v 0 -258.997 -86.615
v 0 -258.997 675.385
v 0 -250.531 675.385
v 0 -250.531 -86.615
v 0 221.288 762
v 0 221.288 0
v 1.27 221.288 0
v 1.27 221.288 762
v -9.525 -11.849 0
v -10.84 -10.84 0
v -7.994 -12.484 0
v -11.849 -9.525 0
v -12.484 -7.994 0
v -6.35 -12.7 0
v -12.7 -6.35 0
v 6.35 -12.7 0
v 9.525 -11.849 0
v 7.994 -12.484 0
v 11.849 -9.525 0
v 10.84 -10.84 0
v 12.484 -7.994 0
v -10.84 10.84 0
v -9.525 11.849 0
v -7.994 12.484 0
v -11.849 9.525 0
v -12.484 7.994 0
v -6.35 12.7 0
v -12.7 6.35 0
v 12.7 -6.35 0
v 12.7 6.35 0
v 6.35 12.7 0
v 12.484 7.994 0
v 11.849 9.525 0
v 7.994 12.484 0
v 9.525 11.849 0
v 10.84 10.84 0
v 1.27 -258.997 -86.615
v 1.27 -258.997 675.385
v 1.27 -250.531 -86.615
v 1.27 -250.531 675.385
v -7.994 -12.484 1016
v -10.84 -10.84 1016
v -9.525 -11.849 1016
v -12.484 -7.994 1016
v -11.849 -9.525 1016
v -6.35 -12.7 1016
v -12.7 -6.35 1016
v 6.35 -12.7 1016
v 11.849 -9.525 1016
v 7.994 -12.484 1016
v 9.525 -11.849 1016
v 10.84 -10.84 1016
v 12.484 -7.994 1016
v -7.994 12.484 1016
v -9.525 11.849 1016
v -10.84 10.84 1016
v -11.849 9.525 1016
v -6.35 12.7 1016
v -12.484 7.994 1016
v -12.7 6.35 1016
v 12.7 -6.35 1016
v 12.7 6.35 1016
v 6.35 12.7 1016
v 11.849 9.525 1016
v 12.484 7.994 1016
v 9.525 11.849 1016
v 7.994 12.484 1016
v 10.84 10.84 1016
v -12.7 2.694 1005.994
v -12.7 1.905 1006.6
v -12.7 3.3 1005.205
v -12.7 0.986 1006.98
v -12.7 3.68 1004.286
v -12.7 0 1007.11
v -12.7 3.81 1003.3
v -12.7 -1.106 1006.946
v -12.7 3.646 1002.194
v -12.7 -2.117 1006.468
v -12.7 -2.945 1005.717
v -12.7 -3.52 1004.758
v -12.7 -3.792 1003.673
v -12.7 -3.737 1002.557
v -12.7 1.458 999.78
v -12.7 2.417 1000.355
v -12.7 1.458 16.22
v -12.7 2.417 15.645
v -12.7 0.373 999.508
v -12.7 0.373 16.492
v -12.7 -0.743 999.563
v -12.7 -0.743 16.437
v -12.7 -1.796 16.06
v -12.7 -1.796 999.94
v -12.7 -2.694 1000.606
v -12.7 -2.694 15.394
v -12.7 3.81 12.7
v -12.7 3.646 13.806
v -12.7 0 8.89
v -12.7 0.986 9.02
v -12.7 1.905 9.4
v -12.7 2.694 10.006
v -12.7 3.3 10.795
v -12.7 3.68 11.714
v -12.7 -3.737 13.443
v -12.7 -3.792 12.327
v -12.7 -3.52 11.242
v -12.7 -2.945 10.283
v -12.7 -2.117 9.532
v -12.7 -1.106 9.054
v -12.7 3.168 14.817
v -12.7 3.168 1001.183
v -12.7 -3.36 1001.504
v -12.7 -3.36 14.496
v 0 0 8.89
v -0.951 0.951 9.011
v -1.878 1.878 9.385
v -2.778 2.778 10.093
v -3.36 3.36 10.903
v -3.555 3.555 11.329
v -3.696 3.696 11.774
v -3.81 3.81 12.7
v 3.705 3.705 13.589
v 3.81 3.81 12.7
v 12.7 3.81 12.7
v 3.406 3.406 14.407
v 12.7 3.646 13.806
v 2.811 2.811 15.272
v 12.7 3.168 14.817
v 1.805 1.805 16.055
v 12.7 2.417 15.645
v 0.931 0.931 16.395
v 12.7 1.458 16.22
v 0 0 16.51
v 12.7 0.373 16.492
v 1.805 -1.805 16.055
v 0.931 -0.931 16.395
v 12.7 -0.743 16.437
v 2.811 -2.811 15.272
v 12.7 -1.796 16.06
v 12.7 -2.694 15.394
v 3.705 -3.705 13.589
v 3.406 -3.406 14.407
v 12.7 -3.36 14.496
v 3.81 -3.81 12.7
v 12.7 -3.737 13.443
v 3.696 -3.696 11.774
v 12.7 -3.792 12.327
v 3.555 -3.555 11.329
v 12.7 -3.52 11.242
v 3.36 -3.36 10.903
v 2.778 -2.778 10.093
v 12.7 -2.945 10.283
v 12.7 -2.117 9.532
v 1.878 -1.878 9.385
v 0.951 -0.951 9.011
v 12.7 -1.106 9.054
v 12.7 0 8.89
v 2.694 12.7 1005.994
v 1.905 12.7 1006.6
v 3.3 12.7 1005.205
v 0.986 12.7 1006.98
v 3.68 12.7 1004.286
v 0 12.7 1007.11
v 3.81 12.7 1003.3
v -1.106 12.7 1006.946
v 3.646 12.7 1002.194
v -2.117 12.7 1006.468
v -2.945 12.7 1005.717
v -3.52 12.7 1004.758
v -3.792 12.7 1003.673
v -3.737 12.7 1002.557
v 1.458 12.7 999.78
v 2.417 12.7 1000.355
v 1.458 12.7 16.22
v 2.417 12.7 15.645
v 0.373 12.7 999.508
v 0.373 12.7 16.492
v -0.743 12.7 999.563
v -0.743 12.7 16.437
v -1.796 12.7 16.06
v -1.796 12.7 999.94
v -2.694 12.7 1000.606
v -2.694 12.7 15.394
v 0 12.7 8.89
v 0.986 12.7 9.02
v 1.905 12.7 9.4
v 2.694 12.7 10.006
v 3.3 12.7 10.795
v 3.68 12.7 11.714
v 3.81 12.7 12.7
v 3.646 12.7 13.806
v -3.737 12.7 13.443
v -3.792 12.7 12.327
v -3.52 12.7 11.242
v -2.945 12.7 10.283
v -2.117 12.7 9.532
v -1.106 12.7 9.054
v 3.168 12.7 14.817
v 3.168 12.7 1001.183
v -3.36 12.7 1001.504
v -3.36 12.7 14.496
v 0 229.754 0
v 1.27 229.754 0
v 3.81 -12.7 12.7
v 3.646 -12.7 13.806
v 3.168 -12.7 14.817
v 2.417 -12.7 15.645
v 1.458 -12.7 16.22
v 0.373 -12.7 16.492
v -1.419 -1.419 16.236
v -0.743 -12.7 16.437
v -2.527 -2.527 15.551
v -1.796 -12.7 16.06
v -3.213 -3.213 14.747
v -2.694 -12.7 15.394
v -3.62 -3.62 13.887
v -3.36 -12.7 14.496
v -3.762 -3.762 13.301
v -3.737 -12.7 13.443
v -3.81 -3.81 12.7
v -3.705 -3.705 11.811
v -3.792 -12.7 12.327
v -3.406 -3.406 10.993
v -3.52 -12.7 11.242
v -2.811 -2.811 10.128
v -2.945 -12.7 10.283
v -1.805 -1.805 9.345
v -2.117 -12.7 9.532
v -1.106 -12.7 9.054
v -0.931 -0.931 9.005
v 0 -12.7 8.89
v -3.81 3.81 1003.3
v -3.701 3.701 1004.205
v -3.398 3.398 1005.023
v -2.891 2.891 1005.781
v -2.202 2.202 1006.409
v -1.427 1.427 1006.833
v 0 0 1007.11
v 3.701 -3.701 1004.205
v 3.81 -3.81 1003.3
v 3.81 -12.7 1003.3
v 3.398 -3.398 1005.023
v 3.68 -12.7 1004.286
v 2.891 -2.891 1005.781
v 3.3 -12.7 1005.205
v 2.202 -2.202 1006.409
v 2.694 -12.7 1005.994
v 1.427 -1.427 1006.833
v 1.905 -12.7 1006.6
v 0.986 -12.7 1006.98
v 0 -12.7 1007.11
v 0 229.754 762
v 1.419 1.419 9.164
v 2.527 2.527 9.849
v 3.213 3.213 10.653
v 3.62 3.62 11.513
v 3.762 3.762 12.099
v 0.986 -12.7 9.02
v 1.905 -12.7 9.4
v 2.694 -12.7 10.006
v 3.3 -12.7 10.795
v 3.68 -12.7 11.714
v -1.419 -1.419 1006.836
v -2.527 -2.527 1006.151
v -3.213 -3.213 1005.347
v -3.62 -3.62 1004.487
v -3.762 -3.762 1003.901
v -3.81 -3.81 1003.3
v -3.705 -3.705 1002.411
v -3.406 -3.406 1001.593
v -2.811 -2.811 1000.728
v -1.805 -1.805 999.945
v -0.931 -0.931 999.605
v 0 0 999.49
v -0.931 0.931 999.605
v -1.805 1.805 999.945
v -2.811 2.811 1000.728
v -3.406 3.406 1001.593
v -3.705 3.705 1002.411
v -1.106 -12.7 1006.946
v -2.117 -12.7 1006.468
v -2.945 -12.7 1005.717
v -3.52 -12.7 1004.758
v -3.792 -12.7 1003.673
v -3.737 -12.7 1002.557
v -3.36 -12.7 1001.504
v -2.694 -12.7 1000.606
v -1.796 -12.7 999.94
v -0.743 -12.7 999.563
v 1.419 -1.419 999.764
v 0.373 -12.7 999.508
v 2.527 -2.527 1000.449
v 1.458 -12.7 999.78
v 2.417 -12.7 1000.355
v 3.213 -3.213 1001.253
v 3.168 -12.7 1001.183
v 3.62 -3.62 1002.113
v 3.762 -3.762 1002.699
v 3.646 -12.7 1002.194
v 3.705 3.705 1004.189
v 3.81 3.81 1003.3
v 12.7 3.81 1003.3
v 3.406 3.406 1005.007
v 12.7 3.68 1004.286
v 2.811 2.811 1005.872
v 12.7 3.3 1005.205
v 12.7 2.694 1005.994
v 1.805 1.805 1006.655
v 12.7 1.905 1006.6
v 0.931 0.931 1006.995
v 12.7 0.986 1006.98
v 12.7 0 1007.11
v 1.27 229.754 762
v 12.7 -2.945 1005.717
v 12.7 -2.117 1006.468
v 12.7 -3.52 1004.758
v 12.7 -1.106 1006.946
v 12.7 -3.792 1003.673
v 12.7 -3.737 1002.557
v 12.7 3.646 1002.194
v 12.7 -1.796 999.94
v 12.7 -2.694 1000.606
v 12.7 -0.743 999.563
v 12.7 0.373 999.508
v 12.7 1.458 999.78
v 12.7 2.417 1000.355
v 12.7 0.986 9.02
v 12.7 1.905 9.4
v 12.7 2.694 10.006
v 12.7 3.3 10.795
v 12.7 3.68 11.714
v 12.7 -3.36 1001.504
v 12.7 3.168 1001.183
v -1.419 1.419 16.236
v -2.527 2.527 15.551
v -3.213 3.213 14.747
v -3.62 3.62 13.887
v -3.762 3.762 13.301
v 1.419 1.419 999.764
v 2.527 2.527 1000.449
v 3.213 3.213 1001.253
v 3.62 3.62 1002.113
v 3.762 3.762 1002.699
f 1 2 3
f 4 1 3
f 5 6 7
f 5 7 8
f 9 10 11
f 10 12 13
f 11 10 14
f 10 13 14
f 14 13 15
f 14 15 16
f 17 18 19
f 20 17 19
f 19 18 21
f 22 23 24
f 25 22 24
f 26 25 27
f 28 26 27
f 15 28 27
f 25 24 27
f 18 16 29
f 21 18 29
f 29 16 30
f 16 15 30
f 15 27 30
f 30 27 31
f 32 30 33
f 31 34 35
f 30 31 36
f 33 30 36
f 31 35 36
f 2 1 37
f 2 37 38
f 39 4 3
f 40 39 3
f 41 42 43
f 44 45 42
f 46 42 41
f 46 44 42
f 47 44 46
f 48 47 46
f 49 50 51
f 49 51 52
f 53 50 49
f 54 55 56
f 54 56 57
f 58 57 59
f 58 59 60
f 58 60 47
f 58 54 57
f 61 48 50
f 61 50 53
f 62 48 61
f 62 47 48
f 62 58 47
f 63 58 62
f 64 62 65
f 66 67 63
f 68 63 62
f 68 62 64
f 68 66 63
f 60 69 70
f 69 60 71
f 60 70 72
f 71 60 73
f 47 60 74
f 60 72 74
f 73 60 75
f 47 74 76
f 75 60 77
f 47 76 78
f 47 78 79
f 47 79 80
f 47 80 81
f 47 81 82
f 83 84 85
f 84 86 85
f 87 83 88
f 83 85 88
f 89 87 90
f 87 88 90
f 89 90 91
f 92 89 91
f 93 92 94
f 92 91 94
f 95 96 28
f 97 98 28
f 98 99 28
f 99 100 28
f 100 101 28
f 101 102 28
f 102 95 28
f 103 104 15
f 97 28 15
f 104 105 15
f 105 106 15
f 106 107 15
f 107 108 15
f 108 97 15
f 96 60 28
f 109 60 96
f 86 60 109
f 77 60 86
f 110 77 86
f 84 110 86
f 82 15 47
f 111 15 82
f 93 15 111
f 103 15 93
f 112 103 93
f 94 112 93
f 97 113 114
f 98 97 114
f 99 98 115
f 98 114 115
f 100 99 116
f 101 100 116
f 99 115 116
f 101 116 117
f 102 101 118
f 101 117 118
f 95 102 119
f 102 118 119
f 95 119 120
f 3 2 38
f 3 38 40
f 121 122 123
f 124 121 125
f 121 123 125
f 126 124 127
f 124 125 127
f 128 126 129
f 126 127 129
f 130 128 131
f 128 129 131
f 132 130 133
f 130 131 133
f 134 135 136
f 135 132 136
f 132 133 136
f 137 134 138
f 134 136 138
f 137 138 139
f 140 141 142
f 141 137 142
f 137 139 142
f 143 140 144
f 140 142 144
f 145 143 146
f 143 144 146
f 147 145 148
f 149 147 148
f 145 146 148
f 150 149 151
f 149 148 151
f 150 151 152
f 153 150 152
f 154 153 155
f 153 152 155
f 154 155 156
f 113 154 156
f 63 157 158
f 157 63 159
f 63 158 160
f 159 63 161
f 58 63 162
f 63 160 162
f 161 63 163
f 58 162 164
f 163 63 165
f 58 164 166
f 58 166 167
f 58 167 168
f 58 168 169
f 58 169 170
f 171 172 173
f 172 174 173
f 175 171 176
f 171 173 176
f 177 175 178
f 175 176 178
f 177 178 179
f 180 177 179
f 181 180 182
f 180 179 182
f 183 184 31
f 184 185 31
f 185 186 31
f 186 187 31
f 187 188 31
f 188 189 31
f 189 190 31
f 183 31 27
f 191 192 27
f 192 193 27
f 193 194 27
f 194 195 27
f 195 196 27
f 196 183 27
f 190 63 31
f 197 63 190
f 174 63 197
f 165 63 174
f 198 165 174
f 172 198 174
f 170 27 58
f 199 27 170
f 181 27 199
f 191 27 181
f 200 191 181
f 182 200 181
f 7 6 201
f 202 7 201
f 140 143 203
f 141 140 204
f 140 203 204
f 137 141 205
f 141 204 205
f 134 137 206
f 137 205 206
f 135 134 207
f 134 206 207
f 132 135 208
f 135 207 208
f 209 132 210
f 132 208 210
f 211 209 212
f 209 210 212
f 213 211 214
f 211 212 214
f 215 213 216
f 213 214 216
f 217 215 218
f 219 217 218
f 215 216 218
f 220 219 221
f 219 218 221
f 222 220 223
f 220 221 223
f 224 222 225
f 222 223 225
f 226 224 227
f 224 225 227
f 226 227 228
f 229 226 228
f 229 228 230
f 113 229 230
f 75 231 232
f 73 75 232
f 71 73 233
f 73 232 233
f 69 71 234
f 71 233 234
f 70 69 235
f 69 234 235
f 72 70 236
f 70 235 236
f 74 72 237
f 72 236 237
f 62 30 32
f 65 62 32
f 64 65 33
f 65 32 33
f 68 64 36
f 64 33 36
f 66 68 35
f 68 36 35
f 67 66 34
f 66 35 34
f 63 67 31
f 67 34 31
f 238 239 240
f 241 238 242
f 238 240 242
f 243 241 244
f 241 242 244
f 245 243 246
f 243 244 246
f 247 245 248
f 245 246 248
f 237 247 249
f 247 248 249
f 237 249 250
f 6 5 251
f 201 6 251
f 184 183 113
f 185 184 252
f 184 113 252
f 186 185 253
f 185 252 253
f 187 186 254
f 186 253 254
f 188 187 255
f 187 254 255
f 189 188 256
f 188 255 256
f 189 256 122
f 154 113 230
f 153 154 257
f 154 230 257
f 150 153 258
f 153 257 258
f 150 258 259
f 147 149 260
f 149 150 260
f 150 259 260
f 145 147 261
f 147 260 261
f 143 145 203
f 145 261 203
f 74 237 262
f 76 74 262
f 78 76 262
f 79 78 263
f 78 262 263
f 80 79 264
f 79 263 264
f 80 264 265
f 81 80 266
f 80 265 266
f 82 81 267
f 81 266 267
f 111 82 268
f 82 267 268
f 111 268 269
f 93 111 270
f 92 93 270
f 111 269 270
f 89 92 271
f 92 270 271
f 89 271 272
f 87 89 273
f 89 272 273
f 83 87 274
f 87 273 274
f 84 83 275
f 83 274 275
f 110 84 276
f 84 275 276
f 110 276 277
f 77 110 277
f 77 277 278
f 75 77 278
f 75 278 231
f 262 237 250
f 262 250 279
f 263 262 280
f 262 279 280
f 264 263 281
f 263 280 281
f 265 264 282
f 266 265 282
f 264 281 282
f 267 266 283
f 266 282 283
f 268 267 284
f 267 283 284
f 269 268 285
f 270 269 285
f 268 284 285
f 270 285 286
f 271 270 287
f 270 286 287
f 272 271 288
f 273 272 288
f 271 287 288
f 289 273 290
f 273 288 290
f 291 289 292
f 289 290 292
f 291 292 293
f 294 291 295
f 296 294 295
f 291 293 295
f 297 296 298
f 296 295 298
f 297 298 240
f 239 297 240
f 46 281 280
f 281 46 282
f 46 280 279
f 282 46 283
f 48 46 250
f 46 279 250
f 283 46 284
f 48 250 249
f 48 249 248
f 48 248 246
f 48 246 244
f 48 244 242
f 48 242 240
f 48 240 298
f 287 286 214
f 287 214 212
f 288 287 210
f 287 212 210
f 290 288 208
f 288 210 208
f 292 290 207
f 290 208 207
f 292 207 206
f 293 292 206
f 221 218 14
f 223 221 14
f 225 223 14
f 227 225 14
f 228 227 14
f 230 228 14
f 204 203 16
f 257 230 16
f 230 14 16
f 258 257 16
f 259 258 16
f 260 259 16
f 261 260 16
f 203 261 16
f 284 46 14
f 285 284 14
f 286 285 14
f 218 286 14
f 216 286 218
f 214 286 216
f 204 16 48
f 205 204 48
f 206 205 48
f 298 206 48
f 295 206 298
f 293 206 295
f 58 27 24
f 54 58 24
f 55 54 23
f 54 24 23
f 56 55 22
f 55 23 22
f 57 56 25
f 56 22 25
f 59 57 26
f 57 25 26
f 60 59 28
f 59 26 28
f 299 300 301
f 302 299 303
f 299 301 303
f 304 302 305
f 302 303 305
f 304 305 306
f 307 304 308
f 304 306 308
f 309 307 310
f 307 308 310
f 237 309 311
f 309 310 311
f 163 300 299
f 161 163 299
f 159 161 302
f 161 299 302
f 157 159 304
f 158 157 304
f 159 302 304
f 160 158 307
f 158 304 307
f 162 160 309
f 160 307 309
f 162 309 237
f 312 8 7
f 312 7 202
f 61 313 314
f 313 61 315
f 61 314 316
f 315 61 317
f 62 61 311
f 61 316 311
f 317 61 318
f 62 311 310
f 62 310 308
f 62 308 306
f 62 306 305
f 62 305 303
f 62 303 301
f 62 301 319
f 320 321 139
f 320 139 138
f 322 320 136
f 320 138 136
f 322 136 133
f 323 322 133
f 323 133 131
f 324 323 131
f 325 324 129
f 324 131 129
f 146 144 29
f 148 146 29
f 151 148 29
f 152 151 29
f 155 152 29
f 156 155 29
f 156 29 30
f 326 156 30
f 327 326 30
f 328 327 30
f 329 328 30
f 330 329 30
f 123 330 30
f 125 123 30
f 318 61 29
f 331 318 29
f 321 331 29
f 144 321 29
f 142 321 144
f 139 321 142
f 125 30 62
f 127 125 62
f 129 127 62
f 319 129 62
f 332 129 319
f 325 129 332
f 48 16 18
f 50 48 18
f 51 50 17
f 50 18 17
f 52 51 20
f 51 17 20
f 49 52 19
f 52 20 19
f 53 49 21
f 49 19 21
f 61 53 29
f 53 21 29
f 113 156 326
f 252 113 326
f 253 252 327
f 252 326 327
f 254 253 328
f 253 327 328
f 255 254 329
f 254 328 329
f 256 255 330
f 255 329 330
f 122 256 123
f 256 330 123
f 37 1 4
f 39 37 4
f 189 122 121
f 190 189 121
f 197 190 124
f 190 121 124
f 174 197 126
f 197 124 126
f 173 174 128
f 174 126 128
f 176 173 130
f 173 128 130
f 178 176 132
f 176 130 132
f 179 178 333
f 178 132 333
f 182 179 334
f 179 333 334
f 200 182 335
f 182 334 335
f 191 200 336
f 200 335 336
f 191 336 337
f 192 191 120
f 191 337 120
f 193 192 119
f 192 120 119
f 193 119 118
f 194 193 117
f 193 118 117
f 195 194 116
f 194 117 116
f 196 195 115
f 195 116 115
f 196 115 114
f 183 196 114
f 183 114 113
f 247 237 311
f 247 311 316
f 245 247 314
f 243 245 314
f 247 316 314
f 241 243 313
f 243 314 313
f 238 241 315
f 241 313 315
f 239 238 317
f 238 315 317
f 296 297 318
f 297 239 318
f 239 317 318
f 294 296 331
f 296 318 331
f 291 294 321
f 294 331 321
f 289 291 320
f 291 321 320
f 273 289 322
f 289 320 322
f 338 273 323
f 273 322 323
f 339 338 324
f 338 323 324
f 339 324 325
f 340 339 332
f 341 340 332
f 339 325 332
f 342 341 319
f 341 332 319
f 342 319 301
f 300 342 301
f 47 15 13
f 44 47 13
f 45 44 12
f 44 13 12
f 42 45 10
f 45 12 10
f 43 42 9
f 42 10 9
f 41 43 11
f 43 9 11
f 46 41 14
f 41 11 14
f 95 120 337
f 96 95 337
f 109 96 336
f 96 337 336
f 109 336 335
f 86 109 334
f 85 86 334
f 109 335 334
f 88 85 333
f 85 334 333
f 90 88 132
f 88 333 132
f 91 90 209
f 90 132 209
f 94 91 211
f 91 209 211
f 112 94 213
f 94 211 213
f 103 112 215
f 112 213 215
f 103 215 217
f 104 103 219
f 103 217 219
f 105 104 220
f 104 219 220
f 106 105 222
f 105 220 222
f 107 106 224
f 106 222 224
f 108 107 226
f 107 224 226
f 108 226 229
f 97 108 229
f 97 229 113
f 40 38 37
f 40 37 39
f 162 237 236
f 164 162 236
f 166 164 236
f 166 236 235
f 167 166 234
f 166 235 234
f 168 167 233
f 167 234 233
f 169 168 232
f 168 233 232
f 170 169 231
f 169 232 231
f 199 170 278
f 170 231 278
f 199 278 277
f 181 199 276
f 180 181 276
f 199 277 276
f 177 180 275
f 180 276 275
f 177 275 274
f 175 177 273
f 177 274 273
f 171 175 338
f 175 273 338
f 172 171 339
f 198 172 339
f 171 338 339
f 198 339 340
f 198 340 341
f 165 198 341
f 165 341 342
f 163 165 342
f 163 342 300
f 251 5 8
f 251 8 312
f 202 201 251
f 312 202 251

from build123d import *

# Parameters (mm, degrees)
F1_DEPTH  = 1016
F2_W      = 8.46582
F2_H      = 762
F3_DEPTH  = 1.27
F4_W      = 8.46582
F4_H      = 762
F5_DEPTH  = 1.27
F7_DEPTH  = 25.4
F8_DEPTH  = 25.4
F10_DEPTH = 25.4


with BuildPart() as f1:
    # F0 (on Top) → F1 (new body)
    with BuildSketch(Plane.XY):
        with BuildLine():
            ThreePointArc((12.7, 6.35), (10.840128, 10.840128), (6.35, 12.7))
            Line((6.35, 12.7), (-6.35, 12.7))
            ThreePointArc((-6.35, 12.7), (-10.840128, 10.840128), (-12.7, 6.35))
            Line((-12.7, 6.35), (-12.7, -6.35))
            ThreePointArc((-12.7, -6.35), (-10.840128, -10.840128), (-6.35, -12.7))
            Line((-6.35, -12.7), (6.35, -12.7))
            ThreePointArc((6.35, -12.7), (10.840128, -10.840128), (12.7, -6.35))
            Line((12.7, -6.35), (12.7, 6.35))
        make_face()
    extrude(amount=F1_DEPTH)

    # F6 (on face) → F7 (cut)
    with BuildSketch(Plane.XZ.offset(12.7)):
        with BuildLine():
            ThreePointArc((3.81, 1003.3), (2.694077, 1005.994077), (0, 1007.11))
            ThreePointArc((0, 1007.11), (-2.694077, 1000.605923), (3.81, 1003.3))
        make_face()
    extrude(amount=-F7_DEPTH, mode=Mode.SUBTRACT)

    # F6 (on face) → F8 (cut)
    with BuildSketch(Plane.XZ.offset(12.7)):
        with BuildLine():
            ThreePointArc((0, 1007.11), (-2.694077, 1000.605923), (3.81, 1003.3))
            ThreePointArc((3.81, 1003.3), (2.694077, 1005.994077), (0, 1007.11))
        make_face()
        with BuildLine():
            ThreePointArc((0, 8.89), (2.694077, 10.005923), (3.81, 12.7))
            ThreePointArc((3.81, 12.7), (-2.694077, 15.394077), (0, 8.89))
        make_face()
    extrude(amount=-F8_DEPTH, mode=Mode.SUBTRACT)

    # F9 (on face) → F10 (cut)
    with BuildSketch(Plane.YZ.offset(12.7)):
        with BuildLine():
            ThreePointArc((3.81, 1003.3), (2.694077, 1005.994077), (0, 1007.11))
            ThreePointArc((0, 1007.11), (-2.694077, 1000.605923), (3.81, 1003.3))
        make_face()
        with BuildLine():
            ThreePointArc((3.81, 12.7), (-2.694077, 15.394077), (0, 8.89))
            ThreePointArc((0, 8.89), (2.694077, 10.005923), (3.81, 12.7))
        make_face()
    extrude(amount=-F10_DEPTH, mode=Mode.SUBTRACT)


with BuildPart() as f3:
    # F2 (on Right) → F3 (new body)
    with BuildSketch(Plane.YZ):
        with Locations((-254.764381, 294.385428)):
            Rectangle(F2_W, F2_H)
    extrude(amount=F3_DEPTH)


with BuildPart() as f5:
    # F4 (on Right) → F5 (new body)
    with BuildSketch(Plane.YZ):
        with Locations((225.521233, 381)):
            Rectangle(F4_W, F4_H)
    extrude(amount=F5_DEPTH)


solid = Compound([f1.part, f3.part, f5.part])
